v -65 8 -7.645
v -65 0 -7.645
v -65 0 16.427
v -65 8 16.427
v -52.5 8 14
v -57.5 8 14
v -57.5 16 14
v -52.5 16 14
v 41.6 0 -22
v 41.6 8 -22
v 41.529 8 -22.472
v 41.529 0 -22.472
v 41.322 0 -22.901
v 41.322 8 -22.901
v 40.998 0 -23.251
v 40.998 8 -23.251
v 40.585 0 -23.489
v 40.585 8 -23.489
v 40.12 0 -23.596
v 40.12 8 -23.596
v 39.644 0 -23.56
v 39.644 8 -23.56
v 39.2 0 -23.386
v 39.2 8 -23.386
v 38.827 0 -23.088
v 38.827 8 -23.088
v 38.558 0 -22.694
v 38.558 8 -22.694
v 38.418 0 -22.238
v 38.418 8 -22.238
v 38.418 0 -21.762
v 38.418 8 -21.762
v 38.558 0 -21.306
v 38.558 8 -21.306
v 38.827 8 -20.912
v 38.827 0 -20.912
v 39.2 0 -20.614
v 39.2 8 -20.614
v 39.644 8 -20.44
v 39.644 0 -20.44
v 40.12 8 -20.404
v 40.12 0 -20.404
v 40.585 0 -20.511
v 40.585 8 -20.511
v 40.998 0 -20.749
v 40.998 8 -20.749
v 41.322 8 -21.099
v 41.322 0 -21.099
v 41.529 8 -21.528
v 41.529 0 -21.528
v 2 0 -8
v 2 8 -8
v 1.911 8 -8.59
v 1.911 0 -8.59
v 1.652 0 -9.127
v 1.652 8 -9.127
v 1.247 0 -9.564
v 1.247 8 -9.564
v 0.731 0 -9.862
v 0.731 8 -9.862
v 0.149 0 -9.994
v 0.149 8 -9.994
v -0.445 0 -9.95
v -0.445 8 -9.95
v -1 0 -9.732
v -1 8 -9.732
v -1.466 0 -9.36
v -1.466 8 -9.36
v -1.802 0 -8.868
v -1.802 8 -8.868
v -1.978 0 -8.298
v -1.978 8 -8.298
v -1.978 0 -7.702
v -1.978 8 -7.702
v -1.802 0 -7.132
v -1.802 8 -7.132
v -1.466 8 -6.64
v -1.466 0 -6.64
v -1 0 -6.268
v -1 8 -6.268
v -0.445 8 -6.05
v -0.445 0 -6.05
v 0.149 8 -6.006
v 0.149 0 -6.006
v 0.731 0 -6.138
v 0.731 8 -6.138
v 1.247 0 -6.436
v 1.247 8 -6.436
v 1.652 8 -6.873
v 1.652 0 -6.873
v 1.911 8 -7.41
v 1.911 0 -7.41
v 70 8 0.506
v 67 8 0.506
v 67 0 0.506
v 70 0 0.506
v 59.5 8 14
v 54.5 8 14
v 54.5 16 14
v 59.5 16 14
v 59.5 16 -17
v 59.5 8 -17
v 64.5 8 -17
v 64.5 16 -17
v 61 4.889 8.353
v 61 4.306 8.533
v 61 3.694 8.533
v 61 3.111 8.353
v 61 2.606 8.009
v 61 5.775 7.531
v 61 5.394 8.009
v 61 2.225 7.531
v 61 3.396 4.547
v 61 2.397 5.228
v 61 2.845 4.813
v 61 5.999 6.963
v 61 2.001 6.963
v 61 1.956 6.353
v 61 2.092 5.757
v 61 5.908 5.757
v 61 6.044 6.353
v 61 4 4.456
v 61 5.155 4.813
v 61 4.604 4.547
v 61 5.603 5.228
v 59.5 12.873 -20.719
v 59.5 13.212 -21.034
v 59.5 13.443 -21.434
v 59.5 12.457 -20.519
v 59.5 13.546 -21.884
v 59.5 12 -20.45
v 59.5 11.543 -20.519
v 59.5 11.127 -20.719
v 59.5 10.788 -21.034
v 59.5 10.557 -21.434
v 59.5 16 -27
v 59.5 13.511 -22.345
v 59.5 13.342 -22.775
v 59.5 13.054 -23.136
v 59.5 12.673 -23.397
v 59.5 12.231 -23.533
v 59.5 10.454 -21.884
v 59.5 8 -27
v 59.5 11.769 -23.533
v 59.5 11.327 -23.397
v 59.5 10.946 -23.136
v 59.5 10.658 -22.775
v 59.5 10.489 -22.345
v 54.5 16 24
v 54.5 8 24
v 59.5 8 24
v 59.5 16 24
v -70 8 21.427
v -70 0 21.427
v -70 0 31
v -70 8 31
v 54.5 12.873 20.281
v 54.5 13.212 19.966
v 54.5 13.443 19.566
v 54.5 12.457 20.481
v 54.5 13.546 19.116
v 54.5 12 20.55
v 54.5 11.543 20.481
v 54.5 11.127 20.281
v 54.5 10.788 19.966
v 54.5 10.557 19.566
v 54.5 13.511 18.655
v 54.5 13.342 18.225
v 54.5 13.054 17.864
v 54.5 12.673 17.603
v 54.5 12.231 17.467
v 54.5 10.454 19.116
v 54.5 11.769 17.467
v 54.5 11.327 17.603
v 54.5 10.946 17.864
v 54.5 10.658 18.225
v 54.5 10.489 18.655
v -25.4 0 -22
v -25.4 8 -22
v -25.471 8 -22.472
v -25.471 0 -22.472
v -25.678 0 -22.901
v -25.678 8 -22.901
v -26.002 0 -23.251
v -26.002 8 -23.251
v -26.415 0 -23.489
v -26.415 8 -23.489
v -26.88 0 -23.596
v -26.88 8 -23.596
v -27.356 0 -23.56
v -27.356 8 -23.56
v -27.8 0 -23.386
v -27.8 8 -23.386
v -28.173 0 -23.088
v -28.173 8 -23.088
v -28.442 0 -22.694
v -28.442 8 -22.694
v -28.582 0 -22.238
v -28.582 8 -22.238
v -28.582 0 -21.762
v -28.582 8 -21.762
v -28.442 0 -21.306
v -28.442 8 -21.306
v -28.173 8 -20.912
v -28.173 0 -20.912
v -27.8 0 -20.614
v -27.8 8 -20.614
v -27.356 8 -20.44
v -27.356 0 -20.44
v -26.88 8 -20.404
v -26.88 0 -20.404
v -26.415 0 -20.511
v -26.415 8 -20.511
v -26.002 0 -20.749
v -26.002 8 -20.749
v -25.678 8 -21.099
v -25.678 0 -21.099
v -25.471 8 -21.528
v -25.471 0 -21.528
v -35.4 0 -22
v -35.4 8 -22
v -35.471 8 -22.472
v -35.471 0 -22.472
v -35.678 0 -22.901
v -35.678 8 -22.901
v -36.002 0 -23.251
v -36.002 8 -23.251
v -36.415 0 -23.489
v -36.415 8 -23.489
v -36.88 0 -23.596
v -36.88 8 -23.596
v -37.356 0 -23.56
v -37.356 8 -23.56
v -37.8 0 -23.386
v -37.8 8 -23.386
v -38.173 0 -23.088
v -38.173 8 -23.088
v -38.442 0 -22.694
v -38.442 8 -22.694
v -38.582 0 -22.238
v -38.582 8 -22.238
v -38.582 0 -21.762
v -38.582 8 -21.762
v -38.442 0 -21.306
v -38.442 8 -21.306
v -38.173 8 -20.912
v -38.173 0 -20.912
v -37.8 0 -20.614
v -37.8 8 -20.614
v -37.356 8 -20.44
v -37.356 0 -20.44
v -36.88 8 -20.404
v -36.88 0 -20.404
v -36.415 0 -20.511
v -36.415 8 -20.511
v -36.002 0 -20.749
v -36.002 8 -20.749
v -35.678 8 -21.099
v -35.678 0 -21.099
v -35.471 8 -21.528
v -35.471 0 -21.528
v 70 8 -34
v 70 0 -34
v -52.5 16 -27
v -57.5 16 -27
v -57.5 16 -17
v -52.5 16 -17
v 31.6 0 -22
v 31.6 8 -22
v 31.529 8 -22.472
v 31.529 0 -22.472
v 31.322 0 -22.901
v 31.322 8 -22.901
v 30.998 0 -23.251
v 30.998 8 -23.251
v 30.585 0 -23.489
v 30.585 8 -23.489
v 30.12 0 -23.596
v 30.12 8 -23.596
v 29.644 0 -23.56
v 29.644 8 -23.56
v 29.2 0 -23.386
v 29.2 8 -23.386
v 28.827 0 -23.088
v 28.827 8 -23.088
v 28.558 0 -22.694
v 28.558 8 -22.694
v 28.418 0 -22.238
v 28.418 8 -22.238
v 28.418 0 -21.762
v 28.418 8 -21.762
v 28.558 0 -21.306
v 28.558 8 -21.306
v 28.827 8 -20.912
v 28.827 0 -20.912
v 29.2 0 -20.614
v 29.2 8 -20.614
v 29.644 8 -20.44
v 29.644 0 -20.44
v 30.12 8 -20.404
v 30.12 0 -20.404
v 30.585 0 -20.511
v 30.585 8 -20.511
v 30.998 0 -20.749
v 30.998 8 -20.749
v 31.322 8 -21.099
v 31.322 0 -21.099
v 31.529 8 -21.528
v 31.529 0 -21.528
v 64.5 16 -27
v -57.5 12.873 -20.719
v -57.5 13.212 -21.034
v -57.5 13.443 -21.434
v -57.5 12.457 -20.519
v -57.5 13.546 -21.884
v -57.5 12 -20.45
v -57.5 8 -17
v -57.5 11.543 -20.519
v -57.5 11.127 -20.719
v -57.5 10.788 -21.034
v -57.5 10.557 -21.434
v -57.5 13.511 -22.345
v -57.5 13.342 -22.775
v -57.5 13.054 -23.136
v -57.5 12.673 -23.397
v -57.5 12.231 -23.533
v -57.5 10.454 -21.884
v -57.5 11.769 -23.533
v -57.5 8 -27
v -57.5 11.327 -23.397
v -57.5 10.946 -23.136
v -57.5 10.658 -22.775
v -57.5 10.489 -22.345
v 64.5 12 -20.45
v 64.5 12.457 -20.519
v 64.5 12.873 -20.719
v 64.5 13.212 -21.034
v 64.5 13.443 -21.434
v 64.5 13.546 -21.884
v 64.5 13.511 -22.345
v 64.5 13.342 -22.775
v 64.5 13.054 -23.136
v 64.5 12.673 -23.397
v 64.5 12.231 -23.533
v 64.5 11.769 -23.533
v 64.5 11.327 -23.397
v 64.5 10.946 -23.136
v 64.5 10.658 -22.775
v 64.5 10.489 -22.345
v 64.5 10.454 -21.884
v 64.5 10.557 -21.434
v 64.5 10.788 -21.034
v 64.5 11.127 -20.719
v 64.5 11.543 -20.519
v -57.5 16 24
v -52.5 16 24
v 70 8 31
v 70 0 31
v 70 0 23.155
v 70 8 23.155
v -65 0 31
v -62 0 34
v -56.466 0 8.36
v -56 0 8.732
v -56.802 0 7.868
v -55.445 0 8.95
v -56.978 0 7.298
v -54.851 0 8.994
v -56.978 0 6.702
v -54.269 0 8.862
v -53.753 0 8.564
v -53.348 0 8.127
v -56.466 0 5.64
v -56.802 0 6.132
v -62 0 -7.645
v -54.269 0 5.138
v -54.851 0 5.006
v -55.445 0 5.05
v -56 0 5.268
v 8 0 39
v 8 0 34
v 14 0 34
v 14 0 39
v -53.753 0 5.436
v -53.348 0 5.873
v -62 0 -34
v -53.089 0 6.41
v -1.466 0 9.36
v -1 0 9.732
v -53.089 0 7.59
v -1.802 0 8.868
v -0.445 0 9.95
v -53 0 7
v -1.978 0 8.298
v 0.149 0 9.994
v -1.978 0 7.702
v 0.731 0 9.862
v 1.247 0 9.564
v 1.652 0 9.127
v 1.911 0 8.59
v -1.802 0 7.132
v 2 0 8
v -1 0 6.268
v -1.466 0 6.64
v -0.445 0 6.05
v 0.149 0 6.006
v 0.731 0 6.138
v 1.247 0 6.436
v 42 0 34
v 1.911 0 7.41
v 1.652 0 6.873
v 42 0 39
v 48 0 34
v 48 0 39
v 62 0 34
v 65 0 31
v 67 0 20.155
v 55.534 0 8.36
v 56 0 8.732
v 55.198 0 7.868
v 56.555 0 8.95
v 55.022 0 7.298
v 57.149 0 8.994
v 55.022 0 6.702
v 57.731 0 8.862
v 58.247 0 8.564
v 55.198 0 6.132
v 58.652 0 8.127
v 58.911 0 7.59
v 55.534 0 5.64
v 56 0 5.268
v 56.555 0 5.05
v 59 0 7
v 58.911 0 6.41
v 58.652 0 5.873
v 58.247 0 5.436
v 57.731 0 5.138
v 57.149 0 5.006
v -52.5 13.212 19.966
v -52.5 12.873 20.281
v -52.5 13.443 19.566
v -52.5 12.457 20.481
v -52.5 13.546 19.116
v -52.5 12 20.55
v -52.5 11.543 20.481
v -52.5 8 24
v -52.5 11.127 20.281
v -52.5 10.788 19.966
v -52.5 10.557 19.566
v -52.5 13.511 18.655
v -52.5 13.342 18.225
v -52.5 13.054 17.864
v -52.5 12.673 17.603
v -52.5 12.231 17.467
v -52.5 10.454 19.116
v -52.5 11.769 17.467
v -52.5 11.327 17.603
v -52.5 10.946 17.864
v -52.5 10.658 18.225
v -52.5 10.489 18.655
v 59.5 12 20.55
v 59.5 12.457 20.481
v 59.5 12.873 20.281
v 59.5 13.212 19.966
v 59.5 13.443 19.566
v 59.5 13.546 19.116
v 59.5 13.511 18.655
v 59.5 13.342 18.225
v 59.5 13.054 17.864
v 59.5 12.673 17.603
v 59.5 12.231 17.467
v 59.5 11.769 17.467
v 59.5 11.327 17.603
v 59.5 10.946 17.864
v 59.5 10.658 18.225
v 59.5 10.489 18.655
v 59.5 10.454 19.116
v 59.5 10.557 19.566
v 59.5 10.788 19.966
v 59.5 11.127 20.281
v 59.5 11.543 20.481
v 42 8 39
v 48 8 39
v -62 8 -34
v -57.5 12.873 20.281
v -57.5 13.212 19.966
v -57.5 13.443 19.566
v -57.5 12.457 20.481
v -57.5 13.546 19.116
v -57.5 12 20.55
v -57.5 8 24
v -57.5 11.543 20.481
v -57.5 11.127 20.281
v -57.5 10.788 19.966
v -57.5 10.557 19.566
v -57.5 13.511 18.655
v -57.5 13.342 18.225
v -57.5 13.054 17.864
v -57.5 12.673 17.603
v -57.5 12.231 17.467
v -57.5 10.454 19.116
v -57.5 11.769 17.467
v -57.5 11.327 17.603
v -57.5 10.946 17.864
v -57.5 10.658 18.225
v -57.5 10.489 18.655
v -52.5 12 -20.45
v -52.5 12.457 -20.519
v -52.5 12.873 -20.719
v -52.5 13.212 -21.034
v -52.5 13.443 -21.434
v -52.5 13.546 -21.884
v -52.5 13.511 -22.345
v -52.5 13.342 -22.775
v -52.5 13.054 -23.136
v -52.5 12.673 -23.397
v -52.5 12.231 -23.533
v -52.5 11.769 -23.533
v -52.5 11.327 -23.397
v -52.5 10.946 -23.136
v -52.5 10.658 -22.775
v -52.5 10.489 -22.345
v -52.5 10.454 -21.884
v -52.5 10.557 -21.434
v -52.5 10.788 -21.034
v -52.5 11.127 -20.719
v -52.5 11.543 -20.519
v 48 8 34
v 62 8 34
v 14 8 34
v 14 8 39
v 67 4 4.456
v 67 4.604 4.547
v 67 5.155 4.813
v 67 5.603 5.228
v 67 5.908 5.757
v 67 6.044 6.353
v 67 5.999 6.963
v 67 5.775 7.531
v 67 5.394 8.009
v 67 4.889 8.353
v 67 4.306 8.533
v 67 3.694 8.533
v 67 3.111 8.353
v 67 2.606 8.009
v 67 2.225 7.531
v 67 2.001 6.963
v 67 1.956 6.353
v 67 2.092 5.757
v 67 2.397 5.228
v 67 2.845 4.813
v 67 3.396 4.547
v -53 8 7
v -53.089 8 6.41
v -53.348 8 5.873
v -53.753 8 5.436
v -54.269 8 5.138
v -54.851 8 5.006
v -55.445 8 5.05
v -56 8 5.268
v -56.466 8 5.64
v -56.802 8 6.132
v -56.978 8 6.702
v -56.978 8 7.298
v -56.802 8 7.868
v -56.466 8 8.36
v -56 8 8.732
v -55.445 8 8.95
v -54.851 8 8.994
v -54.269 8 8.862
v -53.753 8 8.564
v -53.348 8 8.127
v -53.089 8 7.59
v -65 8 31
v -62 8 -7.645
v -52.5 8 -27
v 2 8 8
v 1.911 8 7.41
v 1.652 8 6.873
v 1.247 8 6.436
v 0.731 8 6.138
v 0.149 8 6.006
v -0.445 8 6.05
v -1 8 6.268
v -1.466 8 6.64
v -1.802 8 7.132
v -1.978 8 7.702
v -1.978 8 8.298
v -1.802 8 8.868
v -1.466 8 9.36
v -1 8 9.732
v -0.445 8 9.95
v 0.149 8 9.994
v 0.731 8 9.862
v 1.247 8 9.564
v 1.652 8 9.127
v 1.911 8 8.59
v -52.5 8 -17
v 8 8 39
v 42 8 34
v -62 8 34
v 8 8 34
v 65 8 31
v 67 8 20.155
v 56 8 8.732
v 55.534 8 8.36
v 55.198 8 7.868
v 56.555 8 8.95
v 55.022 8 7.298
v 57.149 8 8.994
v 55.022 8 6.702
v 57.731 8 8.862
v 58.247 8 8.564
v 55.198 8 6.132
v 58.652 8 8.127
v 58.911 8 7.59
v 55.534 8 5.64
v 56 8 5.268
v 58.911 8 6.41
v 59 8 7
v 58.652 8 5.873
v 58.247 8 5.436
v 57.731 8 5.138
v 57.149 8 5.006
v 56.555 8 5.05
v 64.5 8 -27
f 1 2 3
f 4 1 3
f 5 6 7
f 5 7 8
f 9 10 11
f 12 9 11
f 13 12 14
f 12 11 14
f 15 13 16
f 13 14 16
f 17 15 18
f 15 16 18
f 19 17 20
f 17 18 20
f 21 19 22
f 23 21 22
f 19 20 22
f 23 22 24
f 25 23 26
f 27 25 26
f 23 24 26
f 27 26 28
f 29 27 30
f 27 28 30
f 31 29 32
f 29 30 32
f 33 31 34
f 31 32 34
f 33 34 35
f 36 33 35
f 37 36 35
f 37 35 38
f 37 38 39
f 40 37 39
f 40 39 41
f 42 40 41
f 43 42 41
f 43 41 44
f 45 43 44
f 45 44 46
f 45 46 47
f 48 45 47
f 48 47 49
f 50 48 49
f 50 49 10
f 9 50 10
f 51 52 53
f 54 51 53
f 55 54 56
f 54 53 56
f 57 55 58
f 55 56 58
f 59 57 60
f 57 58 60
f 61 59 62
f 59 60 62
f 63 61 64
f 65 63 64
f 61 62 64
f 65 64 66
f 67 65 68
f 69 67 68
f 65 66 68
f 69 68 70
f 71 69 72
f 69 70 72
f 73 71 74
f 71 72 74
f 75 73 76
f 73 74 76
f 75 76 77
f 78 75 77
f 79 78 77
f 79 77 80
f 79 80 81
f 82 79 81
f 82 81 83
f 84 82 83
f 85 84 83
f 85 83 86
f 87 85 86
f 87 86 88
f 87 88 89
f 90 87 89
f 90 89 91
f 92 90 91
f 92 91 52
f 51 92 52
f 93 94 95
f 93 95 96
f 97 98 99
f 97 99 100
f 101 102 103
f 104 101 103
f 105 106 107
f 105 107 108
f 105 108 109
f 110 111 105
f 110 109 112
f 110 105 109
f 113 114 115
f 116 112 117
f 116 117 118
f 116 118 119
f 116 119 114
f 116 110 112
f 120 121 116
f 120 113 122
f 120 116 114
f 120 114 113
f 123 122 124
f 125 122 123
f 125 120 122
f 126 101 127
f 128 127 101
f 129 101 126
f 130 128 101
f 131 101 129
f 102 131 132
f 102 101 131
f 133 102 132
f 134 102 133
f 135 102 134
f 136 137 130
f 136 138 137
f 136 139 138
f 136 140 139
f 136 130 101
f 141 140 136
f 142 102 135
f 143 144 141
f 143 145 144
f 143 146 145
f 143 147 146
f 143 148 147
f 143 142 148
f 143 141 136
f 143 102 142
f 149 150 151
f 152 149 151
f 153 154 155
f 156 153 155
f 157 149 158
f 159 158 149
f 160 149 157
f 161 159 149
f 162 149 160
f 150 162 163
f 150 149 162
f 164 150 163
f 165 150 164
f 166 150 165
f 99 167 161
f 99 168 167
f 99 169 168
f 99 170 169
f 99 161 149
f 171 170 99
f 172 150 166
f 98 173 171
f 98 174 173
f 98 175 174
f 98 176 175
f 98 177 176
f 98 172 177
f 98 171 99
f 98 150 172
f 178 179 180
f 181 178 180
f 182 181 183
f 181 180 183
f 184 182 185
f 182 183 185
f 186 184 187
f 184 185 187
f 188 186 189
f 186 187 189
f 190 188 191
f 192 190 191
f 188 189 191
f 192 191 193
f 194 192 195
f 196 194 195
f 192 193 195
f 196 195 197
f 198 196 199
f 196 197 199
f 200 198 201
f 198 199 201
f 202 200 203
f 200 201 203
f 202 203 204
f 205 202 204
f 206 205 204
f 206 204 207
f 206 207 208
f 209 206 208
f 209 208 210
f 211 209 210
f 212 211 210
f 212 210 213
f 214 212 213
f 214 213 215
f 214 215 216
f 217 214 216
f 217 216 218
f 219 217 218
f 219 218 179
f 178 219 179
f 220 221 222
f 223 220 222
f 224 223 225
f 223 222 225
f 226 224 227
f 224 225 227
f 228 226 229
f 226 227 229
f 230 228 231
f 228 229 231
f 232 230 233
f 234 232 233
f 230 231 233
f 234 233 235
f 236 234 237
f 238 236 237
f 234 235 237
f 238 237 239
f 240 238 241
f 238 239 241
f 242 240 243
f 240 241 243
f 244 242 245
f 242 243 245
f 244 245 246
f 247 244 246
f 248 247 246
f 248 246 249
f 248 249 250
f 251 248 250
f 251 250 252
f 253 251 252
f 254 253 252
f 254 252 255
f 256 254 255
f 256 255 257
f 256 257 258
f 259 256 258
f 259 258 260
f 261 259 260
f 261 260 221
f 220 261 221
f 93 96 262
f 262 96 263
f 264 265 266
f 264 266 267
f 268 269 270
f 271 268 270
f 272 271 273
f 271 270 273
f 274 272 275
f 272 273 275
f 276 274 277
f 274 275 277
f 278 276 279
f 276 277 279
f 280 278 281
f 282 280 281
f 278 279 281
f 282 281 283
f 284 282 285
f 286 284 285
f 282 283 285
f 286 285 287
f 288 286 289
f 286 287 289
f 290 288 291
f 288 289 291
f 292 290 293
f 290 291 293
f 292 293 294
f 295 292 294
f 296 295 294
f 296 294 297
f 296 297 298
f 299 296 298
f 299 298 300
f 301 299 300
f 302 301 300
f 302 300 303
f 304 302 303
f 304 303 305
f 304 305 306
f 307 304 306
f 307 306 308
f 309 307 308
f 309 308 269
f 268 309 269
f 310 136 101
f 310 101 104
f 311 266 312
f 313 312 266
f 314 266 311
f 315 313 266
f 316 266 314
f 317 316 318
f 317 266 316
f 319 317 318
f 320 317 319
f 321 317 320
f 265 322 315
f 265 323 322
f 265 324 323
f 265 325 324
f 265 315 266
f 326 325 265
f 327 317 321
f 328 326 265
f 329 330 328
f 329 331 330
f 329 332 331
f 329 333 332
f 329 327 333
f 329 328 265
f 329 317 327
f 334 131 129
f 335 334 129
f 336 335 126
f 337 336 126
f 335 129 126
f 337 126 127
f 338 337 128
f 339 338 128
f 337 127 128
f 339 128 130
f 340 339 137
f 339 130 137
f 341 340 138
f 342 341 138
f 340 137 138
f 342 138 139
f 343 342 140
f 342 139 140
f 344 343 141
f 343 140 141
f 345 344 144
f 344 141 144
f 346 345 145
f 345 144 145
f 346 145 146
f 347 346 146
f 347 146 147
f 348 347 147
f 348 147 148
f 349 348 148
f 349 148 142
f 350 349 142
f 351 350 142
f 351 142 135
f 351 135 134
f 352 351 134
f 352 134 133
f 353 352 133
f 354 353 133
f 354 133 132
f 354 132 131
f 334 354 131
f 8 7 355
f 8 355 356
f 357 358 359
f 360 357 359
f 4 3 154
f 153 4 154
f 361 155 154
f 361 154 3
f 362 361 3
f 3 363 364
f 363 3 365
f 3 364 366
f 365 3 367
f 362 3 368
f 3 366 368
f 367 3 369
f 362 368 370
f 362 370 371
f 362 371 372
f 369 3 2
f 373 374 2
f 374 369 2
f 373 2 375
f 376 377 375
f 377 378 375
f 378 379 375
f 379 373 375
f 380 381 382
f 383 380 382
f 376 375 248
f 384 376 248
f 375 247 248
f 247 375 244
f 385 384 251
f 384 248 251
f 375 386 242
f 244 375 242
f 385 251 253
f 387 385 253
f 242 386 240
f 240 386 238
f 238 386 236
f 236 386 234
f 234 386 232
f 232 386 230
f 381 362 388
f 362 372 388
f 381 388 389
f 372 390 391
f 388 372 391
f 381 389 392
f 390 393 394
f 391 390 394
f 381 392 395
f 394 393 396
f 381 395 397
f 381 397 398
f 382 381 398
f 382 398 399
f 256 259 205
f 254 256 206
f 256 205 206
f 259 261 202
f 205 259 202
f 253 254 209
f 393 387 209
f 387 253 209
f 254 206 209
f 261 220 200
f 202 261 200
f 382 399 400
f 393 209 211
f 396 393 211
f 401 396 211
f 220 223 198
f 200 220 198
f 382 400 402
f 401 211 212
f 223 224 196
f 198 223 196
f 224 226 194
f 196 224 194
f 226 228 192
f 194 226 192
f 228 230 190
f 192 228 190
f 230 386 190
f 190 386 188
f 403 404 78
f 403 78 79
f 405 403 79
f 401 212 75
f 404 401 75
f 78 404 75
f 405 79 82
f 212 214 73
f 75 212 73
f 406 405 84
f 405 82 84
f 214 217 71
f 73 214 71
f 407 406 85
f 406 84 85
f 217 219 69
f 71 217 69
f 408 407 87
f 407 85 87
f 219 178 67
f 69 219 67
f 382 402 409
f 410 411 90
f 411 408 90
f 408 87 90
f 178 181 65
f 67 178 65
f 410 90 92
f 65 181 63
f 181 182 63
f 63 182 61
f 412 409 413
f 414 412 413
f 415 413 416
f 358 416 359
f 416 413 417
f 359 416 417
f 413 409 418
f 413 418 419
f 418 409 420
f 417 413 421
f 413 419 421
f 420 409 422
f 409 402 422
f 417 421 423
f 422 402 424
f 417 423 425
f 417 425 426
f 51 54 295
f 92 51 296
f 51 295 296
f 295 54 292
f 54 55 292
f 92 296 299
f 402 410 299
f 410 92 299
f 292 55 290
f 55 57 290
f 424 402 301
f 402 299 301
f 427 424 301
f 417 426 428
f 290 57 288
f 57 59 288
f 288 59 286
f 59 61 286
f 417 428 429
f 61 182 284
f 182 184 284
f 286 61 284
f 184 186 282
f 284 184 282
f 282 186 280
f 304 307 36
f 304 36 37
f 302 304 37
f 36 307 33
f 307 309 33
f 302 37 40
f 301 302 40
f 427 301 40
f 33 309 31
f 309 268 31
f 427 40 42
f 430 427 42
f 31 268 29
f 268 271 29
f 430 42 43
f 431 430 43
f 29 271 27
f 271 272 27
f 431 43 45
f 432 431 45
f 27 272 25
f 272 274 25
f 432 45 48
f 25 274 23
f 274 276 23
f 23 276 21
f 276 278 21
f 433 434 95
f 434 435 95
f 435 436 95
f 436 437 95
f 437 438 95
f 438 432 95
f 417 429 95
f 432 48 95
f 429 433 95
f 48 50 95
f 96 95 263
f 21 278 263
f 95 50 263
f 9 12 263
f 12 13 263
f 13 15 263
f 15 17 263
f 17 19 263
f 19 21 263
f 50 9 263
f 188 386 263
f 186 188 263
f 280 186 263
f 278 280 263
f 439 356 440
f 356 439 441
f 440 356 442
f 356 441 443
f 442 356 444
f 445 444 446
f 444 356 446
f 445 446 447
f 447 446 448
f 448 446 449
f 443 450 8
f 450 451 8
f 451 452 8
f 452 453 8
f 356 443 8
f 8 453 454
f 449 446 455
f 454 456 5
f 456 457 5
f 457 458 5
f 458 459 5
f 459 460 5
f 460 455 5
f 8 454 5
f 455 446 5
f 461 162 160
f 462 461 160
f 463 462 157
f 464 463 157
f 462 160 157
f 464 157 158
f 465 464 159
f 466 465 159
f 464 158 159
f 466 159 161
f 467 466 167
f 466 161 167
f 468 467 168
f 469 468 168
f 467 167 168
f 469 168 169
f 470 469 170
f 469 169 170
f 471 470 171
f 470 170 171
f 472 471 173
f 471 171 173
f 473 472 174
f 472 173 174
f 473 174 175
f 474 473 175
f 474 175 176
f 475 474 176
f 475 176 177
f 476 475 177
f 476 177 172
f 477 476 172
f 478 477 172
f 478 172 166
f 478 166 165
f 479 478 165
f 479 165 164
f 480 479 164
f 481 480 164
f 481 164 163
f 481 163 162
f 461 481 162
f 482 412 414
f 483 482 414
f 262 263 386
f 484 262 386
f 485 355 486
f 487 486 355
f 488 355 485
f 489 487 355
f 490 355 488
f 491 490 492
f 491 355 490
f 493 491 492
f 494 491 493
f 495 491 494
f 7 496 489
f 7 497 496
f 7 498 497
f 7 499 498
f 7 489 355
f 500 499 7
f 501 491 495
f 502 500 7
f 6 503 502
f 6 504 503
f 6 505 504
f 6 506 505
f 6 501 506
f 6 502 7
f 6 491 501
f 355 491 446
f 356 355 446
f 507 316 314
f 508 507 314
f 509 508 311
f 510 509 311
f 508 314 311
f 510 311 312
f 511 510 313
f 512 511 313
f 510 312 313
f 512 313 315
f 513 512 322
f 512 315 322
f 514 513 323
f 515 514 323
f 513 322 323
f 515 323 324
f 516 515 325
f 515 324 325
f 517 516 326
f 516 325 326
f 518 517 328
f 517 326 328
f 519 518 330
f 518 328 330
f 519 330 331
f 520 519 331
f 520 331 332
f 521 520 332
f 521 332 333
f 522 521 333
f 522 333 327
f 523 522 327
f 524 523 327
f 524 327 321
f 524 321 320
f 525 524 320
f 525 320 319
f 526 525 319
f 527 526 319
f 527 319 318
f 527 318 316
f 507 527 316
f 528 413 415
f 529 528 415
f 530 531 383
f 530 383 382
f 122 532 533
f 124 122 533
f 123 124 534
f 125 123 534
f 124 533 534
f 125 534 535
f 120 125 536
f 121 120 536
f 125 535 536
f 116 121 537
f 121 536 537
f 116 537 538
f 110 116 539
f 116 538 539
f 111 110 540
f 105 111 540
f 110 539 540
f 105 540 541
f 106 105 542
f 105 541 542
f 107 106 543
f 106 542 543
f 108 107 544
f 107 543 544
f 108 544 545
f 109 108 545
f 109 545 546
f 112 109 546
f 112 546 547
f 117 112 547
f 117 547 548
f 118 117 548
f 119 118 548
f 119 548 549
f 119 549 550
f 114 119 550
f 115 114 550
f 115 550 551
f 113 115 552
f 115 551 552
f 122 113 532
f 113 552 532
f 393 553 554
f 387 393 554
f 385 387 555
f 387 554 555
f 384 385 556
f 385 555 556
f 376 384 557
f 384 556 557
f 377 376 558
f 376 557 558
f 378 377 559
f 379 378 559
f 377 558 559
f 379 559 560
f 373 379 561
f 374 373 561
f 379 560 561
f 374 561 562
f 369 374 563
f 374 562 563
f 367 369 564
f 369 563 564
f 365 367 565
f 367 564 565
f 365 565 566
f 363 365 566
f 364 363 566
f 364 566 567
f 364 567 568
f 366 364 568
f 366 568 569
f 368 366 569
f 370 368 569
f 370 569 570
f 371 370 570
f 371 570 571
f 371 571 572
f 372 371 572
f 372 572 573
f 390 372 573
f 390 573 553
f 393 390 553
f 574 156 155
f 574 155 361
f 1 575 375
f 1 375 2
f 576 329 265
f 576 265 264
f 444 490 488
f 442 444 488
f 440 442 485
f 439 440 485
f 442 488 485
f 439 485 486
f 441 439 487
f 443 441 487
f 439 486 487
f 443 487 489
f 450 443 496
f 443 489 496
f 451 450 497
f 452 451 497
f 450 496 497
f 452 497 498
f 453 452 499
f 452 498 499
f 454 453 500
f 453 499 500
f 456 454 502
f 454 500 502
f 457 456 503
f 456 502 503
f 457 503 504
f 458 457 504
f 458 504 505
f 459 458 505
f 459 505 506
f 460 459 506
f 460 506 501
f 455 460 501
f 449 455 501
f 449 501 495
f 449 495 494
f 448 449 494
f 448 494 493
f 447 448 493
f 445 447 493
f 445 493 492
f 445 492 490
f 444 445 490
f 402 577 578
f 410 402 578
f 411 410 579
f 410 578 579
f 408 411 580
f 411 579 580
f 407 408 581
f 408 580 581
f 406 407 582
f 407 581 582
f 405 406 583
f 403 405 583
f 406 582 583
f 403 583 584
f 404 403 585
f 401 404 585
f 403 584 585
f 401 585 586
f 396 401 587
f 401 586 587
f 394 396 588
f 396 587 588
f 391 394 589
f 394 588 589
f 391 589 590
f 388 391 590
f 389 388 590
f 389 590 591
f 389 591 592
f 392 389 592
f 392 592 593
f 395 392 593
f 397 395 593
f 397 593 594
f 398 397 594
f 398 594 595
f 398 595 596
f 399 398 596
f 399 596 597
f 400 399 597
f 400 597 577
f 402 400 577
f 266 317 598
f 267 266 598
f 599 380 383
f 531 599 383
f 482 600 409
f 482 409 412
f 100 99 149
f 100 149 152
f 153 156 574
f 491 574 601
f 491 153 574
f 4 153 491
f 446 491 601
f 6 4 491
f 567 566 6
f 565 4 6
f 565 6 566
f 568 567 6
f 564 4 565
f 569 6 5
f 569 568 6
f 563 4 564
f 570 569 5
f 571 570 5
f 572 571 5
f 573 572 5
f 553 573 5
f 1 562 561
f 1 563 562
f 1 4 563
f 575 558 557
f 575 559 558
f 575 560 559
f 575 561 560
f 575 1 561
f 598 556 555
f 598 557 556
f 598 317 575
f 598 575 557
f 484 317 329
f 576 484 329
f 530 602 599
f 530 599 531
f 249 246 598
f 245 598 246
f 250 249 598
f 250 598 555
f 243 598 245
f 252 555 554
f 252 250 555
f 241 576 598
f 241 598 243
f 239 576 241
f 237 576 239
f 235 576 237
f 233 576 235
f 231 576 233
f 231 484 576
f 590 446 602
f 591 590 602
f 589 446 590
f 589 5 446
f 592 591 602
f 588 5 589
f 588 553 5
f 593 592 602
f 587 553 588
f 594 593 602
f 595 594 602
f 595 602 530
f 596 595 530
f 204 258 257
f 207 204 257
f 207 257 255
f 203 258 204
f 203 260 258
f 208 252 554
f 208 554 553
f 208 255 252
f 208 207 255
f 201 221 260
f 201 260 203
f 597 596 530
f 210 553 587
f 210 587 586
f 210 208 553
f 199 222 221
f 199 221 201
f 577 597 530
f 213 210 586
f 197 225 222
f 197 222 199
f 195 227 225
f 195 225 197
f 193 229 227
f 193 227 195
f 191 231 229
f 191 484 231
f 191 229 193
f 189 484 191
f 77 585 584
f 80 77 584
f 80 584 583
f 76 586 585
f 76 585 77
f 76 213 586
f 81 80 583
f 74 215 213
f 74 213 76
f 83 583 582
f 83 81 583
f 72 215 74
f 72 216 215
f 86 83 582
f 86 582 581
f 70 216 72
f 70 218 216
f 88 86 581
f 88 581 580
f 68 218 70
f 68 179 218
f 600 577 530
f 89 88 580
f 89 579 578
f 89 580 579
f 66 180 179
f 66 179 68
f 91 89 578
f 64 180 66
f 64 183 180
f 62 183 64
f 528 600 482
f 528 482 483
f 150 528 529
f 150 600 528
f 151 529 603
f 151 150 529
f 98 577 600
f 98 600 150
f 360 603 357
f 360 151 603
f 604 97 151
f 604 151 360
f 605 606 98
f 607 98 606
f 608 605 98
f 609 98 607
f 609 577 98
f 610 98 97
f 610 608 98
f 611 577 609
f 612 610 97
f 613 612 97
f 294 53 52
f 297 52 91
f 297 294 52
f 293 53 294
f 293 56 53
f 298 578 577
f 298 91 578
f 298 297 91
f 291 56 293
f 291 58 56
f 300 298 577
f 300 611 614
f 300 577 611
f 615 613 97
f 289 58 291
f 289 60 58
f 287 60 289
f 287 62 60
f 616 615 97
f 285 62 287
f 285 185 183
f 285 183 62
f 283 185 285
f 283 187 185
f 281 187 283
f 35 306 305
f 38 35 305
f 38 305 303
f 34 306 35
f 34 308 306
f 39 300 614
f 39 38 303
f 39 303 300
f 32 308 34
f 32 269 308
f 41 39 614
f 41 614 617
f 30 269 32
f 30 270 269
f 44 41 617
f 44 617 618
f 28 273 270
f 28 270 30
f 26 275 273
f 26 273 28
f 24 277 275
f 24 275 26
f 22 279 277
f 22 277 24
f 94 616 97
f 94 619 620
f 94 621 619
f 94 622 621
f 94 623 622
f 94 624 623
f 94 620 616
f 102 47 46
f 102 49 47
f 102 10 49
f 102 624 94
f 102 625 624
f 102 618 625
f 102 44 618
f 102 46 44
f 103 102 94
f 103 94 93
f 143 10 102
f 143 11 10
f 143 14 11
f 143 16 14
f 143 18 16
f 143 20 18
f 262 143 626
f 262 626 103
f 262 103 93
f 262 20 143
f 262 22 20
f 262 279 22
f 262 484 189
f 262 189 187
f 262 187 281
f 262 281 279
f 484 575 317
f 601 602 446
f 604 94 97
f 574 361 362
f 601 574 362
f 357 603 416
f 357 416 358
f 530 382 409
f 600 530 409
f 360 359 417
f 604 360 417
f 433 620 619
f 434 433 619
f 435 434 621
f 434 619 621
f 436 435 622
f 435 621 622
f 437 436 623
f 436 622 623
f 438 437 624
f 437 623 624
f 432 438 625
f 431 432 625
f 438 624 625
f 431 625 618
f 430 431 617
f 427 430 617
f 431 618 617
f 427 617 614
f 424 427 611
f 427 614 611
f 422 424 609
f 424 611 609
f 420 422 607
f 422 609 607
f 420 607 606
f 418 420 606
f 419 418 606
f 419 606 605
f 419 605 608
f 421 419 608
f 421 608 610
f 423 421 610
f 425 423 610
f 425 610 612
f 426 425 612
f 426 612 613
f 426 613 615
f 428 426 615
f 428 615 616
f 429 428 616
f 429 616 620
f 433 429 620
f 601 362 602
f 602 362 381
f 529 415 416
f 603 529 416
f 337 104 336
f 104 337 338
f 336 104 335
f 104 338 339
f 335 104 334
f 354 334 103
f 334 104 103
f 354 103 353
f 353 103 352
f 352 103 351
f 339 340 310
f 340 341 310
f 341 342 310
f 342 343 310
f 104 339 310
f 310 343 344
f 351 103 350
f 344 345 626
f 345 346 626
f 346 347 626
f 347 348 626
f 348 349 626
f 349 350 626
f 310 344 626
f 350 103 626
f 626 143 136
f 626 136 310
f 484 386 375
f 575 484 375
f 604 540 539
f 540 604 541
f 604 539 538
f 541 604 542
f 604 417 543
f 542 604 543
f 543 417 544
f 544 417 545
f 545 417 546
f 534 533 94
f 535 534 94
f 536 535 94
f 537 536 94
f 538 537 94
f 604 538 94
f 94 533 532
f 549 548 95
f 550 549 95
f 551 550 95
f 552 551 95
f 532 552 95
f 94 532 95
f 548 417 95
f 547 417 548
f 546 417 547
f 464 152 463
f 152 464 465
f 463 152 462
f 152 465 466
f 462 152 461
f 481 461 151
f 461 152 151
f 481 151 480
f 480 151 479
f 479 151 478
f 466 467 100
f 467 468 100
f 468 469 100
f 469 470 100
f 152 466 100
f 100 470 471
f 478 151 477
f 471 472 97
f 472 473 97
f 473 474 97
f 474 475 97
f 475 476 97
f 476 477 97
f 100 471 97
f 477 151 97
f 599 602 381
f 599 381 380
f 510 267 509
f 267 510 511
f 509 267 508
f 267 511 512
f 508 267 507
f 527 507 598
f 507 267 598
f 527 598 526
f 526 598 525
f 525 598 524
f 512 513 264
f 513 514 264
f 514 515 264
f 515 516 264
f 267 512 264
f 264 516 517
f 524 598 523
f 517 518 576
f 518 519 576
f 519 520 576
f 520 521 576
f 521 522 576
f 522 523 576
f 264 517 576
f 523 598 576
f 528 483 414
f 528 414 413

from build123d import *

# Parameters (mm, degrees)
BOSS_EXTRUDE1_DEPTH = 8
SKETCH2_R           = 2
CUT_EXTRUDE1_DEPTH  = 9
SKETCH3_R           = 2
SKETCH3_R_2         = 1.6
CUT_EXTRUDE2_DEPTH  = 9
SKETCH4_R           = 2.05
CUT_EXTRUDE3_DEPTH  = 6
SKETCH5_W           = 5
SKETCH5_H           = 10
BOSS_EXTRUDE2_DEPTH = 8
SKETCH6_R           = 1.55
CUT_EXTRUDE4_DEPTH  = 128.5


with BuildPart() as part:
    # Sketch1 → Boss-Extrude1 (new body)
    with BuildSketch(Plane(origin=(0, 0, 0), x_dir=(1, 0, 0), z_dir=(0, 1, 0))):
        Polygon((70, 34), (-62, 34), (-62, 7.645012604), (-65, 7.645012604), (-65, -16.427077226), (-70, -21.427077226), (-70, -31), (-65, -31), (-62, -34), (8, -34), (8, -39), (14, -39), (14, -34), (42, -34), (42, -39), (48, -39), (48, -34), (62, -34), (65, -31), (70, -31), (70, -23.155364425), (67, -20.155364425), (67, -0.506394588), (70, -0.506394588), align=None)
    extrude(amount=BOSS_EXTRUDE1_DEPTH)

    # Sketch2 → Cut-Extrude1 (cut, through all)
    with BuildSketch(Plane(origin=(0, 8, 0), x_dir=(1, 0, 0), z_dir=(0, 1, 0))):
        with Locations((0, 8)):
            Circle(SKETCH2_R)
        with Locations((0, -8)):
            Circle(SKETCH2_R)
    extrude(amount=-CUT_EXTRUDE1_DEPTH, mode=Mode.SUBTRACT)

    # Sketch3 → Cut-Extrude2 (cut, through all)
    with BuildSketch(Plane(origin=(0, 8, 0), x_dir=(1, 0, 0), z_dir=(0, 1, 0))):
        with Locations((57, -7)):
            Circle(SKETCH3_R)
        with Locations((-37, 22)):
            Circle(SKETCH3_R_2)
        with Locations((-27, 22)):
            Circle(SKETCH3_R_2)
        with Locations((30, 22)):
            Circle(SKETCH3_R_2)
        with Locations((40, 22)):
            Circle(SKETCH3_R_2)
        with Locations((-55, -7)):
            Circle(SKETCH3_R)
    extrude(amount=-CUT_EXTRUDE2_DEPTH, mode=Mode.SUBTRACT)

    # Sketch4 → Cut-Extrude3 (cut)
    with BuildSketch(Plane(origin=(67, 0, 0), x_dir=(0, 0, -1), z_dir=(1, 0, 0))):
        with Locations((-6.506394588, 4)):
            Circle(SKETCH4_R)
    extrude(amount=-CUT_EXTRUDE3_DEPTH, mode=Mode.SUBTRACT)

    # Sketch5 → Boss-Extrude2 (add)
    with BuildSketch(Plane(origin=(0, 8, 0), x_dir=(1, 0, 0), z_dir=(0, 1, 0))):
        with Locations((-55, -19)):
            Rectangle(SKETCH5_W, SKETCH5_H)
        with Locations((-55, 22)):
            Rectangle(SKETCH5_W, SKETCH5_H)
        with Locations((57, -19)):
            Rectangle(SKETCH5_W, SKETCH5_H)
        with Locations((62, 22)):
            Rectangle(SKETCH5_W, SKETCH5_H)
    extrude(amount=BOSS_EXTRUDE2_DEPTH)

    # Sketch6 → Cut-Extrude4 (cut, through all)
    with BuildSketch(Plane.ZY.offset(57.5)):
        with Locations((-22, 12)):
            Circle(SKETCH6_R)
        with Locations((19, 12)):
            Circle(SKETCH6_R)
    extrude(amount=-CUT_EXTRUDE4_DEPTH, mode=Mode.SUBTRACT)


solid = part.part
